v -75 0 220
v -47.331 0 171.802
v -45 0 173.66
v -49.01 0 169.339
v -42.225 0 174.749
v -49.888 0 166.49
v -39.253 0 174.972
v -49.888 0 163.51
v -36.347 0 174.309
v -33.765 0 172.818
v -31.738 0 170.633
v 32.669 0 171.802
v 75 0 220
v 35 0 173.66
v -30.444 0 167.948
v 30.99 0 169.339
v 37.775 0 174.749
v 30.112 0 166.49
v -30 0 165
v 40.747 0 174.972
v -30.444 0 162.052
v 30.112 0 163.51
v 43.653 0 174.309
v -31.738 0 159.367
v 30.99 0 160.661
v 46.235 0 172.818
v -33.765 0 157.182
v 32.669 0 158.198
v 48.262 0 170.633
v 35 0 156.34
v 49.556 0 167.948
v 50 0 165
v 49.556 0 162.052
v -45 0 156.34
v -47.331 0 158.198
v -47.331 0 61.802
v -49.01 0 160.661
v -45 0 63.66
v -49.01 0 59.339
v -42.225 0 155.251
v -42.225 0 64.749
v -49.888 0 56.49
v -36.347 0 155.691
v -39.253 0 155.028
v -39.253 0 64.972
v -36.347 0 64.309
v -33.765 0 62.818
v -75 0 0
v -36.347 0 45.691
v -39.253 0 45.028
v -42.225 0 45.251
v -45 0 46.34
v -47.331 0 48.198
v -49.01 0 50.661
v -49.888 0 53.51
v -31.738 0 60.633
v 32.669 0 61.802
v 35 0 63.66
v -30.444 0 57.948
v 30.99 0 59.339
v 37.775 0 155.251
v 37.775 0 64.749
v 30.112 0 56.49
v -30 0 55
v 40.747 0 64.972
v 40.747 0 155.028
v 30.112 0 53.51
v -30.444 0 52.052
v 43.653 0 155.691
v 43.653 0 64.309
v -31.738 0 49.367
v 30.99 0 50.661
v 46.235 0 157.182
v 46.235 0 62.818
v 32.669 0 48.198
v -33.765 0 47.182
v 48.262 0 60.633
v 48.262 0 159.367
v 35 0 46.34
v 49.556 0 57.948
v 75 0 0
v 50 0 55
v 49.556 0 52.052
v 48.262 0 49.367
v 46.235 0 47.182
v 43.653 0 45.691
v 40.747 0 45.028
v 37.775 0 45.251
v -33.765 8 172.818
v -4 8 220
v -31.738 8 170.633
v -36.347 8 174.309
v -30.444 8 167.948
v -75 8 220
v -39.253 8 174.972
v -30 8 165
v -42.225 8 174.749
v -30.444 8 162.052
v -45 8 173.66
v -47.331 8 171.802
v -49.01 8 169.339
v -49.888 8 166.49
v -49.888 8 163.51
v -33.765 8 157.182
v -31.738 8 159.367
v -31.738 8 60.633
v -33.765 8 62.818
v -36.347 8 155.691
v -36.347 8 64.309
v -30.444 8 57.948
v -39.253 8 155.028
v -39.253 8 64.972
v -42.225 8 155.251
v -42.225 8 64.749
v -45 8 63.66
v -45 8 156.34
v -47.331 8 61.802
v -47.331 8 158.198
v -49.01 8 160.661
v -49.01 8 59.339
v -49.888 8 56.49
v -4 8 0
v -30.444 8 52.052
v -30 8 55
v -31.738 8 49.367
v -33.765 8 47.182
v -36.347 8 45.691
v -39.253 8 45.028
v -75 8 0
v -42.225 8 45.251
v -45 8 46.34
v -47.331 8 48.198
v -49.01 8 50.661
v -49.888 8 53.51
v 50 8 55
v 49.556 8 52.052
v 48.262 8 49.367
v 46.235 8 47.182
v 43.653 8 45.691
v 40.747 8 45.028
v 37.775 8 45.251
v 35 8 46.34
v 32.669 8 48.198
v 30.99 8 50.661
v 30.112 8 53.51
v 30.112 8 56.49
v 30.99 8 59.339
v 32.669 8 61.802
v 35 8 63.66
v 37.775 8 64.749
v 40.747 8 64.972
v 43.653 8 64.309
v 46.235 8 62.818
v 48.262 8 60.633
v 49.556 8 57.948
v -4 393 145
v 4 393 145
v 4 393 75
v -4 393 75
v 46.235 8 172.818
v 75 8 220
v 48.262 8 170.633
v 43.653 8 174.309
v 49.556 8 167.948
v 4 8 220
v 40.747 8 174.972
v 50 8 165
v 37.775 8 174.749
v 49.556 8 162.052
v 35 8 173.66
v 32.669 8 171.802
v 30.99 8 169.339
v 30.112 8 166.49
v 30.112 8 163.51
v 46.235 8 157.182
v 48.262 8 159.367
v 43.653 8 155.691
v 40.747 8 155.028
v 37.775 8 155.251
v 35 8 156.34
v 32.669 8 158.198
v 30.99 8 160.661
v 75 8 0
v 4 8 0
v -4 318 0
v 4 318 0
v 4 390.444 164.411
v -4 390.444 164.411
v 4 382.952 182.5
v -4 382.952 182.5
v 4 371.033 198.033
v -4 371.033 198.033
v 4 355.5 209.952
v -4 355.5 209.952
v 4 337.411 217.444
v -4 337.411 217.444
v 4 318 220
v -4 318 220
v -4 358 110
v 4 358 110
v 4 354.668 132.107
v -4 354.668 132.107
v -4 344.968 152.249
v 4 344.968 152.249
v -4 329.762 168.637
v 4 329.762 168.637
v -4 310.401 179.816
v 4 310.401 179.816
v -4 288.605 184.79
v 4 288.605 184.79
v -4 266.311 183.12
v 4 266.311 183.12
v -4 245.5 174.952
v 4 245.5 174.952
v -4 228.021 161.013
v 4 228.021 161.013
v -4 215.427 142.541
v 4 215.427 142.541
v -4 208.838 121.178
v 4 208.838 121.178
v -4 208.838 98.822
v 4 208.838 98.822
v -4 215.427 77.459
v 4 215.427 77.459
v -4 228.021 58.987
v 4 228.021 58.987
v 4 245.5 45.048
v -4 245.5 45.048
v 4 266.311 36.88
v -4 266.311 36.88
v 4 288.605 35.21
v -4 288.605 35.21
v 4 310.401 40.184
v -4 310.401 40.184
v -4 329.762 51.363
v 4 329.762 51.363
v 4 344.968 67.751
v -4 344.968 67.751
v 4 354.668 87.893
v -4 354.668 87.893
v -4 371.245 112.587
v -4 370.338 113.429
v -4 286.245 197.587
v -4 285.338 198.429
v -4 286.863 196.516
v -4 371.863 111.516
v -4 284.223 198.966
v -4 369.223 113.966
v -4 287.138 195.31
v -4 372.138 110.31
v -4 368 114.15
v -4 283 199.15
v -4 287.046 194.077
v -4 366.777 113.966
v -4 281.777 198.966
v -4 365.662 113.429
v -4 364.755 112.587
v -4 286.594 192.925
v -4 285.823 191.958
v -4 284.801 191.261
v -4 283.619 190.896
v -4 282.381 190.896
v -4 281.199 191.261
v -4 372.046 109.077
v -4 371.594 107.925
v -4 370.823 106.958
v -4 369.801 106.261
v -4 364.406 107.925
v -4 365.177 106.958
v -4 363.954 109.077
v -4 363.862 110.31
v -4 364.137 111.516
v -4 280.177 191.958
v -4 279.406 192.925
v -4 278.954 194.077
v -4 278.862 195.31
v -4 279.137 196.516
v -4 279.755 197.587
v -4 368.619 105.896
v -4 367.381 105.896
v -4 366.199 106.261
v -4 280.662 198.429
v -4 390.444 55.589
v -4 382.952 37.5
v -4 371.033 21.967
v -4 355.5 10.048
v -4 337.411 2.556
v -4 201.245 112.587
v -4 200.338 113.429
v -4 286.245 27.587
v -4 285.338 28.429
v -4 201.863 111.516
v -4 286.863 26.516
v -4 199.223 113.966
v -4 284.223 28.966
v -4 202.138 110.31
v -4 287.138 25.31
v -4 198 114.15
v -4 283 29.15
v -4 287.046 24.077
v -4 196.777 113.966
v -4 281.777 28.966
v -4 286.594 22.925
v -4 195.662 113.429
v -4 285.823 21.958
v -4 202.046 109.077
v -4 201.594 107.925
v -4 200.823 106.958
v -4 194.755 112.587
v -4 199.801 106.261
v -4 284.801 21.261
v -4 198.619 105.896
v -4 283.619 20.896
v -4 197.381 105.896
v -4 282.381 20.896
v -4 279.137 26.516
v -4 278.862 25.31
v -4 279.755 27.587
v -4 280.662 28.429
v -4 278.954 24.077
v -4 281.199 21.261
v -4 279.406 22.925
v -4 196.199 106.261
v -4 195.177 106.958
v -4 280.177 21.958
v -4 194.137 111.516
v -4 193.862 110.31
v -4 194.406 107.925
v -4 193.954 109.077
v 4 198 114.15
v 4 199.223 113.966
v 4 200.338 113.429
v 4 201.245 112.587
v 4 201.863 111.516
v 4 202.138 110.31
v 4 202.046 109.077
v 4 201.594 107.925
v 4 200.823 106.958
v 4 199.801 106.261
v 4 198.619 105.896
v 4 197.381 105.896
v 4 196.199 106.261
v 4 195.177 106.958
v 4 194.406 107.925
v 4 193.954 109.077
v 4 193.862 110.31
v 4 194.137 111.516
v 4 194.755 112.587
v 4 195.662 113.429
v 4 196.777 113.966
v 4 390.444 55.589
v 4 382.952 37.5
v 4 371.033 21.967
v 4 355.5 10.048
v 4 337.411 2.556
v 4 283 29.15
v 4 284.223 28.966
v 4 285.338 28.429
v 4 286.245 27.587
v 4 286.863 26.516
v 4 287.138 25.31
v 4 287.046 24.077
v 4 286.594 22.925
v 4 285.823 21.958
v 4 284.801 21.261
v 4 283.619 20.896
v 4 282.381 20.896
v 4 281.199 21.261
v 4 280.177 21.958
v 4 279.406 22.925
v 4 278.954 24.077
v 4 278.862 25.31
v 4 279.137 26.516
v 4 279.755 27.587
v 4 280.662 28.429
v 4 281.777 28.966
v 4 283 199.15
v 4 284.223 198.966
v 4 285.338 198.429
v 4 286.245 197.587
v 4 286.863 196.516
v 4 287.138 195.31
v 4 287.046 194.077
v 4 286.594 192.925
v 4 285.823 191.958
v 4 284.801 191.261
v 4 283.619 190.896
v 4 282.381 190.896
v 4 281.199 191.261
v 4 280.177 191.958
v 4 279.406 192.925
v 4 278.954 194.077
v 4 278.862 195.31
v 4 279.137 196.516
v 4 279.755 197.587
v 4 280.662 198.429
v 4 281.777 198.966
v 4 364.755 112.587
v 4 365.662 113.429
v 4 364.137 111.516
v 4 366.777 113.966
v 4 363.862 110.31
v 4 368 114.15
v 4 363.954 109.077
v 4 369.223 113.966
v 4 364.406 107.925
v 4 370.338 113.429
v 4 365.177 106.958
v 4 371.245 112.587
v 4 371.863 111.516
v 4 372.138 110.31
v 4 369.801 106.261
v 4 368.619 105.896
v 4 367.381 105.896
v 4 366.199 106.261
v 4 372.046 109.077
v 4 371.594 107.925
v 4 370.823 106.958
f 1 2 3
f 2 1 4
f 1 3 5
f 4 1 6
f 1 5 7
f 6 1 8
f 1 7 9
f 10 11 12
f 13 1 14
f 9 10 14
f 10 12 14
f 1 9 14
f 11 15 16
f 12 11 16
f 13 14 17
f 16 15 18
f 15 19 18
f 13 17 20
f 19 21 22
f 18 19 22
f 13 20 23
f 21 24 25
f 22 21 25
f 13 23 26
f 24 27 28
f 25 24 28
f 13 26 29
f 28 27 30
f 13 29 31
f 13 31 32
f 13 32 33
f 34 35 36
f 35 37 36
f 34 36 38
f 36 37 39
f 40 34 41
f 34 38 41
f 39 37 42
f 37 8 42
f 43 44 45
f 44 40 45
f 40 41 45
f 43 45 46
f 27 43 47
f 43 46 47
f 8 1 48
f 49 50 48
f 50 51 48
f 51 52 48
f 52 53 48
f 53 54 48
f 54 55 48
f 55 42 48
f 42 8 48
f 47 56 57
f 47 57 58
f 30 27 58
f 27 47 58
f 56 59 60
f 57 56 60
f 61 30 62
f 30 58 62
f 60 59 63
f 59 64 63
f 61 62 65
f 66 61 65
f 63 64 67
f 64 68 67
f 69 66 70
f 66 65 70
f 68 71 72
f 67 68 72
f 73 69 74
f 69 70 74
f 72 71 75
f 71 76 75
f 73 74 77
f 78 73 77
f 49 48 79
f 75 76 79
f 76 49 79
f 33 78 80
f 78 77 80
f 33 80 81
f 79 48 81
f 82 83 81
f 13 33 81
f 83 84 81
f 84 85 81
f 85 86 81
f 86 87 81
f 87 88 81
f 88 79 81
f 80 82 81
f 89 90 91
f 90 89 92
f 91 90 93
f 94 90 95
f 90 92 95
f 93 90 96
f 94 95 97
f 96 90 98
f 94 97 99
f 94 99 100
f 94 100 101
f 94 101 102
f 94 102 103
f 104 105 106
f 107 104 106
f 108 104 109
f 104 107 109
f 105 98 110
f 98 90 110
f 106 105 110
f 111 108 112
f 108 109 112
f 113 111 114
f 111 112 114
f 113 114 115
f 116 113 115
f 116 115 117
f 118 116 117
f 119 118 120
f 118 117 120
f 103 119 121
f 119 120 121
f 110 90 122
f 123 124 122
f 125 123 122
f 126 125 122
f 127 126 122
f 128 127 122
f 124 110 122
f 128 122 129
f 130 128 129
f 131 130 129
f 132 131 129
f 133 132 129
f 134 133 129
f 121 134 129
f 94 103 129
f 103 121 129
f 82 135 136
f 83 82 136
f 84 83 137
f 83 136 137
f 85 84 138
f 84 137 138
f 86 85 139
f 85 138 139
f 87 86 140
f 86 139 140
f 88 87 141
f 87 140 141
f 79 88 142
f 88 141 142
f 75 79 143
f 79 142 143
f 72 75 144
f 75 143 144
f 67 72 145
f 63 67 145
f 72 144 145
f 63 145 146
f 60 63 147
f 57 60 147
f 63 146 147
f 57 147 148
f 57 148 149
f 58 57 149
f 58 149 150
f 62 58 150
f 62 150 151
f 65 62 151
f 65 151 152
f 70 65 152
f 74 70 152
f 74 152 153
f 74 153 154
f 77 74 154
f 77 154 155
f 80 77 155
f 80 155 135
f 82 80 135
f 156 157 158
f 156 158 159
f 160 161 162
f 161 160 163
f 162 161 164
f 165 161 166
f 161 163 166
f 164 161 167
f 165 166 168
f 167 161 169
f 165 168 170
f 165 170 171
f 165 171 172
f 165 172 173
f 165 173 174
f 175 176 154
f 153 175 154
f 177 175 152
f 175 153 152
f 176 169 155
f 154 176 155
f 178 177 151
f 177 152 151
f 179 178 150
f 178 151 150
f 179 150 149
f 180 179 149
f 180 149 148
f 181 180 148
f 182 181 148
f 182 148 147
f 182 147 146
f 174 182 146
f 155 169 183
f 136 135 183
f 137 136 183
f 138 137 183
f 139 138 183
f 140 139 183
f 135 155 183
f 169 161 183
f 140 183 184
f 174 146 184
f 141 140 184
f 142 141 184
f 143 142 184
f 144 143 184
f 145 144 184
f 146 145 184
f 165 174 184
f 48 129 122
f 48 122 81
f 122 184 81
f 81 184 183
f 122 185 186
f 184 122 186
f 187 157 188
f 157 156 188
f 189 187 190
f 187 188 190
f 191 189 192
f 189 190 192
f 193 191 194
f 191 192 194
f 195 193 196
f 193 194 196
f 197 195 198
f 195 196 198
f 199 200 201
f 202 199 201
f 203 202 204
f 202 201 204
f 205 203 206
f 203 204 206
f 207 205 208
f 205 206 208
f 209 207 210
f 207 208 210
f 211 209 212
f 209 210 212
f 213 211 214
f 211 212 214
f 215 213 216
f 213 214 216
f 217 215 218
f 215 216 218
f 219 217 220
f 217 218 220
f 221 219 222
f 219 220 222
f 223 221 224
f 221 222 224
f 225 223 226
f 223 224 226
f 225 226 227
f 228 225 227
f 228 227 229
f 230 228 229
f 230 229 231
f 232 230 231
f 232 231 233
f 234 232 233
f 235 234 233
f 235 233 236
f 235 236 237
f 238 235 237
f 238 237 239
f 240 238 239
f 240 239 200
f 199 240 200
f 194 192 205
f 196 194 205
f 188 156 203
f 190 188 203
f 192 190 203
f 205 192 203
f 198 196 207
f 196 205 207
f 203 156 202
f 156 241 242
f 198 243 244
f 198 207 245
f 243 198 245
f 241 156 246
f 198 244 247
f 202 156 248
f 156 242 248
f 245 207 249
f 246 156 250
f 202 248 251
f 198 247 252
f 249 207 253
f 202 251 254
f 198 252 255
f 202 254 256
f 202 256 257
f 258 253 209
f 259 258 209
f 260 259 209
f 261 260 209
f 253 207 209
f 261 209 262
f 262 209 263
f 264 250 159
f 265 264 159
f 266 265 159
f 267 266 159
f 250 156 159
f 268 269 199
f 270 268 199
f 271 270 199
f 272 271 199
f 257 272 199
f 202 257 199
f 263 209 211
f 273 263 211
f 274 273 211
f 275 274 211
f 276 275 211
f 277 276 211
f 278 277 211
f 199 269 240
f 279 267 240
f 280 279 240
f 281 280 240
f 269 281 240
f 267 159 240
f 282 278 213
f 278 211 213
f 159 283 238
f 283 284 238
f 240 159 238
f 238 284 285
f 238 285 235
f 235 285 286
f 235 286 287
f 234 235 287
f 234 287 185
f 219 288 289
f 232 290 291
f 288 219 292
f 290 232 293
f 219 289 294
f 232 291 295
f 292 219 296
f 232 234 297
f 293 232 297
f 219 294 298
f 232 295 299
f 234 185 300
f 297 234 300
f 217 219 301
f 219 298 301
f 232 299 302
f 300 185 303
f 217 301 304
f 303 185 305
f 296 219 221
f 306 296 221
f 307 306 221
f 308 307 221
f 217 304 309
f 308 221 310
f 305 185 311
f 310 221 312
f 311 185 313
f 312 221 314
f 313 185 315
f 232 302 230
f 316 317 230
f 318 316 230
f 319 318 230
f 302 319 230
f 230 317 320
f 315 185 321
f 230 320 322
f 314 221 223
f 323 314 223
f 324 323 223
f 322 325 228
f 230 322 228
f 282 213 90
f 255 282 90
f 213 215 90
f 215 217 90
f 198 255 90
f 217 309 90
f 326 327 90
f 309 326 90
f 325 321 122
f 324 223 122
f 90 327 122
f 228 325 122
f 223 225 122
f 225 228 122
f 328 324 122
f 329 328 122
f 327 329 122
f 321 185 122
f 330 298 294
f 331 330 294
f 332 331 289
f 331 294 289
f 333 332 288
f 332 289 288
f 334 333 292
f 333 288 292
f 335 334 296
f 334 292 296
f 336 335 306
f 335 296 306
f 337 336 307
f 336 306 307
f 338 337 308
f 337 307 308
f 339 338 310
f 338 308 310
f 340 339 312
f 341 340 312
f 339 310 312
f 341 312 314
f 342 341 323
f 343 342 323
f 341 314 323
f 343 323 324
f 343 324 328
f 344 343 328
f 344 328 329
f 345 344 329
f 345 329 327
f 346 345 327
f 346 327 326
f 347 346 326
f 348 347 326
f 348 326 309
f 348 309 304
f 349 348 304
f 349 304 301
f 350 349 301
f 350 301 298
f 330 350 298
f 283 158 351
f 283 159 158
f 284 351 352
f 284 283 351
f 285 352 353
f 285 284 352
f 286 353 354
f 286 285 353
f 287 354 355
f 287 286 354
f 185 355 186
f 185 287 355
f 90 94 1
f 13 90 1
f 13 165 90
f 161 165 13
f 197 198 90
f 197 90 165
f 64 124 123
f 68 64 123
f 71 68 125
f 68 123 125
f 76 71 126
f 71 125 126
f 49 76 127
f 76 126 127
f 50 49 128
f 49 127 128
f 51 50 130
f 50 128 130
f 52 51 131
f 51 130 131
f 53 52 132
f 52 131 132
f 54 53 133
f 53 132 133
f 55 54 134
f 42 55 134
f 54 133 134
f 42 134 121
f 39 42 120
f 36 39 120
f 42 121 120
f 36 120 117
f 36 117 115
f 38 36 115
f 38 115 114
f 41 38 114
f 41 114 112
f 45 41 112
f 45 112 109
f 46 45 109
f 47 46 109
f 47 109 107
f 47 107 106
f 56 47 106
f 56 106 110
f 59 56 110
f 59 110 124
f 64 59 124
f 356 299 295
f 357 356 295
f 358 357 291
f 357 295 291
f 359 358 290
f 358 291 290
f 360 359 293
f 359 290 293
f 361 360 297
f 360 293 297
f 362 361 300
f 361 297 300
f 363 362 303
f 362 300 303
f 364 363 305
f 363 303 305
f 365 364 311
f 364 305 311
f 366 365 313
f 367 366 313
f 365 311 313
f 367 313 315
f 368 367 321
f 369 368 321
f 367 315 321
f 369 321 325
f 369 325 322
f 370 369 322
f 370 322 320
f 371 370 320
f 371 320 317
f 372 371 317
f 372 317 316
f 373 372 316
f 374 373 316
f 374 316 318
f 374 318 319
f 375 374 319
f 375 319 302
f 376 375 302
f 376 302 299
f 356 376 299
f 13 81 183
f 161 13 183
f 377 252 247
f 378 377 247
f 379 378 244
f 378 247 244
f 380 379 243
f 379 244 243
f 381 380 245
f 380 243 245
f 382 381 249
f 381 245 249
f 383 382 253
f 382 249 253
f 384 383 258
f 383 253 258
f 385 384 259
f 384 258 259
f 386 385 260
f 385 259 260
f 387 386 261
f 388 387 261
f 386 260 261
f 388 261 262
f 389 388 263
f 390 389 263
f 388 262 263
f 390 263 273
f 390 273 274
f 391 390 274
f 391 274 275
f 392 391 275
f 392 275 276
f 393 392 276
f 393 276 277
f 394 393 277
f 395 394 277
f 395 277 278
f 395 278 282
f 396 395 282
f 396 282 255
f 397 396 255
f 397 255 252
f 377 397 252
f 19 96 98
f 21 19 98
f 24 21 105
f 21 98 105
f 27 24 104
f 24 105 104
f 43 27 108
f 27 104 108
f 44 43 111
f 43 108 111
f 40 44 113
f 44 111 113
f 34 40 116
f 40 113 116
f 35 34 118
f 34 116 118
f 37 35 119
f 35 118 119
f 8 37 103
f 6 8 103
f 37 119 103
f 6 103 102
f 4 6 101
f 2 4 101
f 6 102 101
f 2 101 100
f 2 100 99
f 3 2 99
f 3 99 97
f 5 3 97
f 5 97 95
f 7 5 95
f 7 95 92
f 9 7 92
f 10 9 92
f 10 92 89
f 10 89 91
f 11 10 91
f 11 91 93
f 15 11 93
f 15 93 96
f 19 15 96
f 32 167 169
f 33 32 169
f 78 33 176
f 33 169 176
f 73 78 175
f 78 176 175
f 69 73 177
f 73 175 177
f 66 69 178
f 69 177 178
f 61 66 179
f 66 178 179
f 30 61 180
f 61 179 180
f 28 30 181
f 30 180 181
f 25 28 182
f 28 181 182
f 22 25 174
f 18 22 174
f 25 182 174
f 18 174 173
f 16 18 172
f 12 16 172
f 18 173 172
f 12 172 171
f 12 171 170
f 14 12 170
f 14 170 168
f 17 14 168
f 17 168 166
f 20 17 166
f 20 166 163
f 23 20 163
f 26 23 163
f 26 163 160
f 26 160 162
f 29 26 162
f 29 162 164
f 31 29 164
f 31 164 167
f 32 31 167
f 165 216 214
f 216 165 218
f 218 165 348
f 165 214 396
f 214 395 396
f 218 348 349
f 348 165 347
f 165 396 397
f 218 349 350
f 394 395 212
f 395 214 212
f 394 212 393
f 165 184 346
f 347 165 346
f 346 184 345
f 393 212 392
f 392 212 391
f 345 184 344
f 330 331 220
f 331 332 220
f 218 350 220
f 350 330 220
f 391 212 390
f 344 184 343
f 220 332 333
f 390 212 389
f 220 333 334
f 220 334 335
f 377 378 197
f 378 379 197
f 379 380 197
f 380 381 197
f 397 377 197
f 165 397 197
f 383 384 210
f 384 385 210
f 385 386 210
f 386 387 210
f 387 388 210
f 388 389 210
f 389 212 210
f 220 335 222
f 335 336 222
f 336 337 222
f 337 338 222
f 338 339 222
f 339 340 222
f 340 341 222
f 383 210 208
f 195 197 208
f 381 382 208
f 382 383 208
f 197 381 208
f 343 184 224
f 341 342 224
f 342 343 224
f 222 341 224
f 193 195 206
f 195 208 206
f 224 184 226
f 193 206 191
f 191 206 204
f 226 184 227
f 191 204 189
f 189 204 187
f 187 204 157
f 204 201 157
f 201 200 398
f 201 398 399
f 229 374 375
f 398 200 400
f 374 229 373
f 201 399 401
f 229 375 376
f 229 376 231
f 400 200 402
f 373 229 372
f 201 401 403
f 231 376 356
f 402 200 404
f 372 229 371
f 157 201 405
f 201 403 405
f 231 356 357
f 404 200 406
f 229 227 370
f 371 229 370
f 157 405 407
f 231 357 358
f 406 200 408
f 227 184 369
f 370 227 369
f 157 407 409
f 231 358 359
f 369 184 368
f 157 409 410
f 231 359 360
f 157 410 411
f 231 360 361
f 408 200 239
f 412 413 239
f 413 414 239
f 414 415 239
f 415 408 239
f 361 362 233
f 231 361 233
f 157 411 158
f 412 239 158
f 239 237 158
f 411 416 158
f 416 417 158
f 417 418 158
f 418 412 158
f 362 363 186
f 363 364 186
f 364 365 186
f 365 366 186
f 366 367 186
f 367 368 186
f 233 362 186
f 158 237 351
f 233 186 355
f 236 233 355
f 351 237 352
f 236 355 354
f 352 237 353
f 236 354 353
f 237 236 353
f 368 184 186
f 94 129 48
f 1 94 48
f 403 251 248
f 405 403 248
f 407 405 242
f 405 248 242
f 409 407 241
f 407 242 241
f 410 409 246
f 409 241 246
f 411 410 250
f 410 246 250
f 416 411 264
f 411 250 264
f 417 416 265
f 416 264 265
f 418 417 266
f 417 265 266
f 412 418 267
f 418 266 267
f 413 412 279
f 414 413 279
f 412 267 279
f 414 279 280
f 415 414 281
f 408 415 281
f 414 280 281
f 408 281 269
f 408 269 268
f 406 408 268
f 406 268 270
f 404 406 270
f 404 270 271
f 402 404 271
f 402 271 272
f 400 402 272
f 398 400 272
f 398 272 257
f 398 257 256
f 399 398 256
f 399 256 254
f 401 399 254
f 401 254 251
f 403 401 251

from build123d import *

# Parameters (mm, degrees)
BOSS_EXTRUDE1_DEPTH     = 220
F_20_0MM_DOWEL_HOLE1_D  = 20
FILLET1_R               = 75
SKETCH4_R               = 75
CUT_EXTRUDE1_DEPTH      = 458.263600126
F_8_0_MM_DOWEL_HOLES1_D = 8.3


with BuildPart() as part:
    # Sketch1 → Boss-Extrude1 (new body)
    with BuildSketch(Plane.XY):
        Polygon((-4, 393), (-4, 8), (-75, 8), (-75, 0), (75, 0), (75, 8), (4, 8), (4, 393), align=None)
    extrude(amount=BOSS_EXTRUDE1_DEPTH)

    # Ø20.0mm Dowel Hole1 (through all)
    with Locations(Plane(origin=(0, 0, 0), x_dir=(-1, 0, 0), z_dir=(0, -1, 0))):
        with Locations((-40, -55), (-40, -165), (40, -165), (40, -55)):
            Hole(F_20_0MM_DOWEL_HOLE1_D / 2)

    # Fillet1
    fillet1_edges = [part.edges().sort_by_distance(p)[0] for p in [
        (0, 393, 0),
        (0, 393, 220),
    ]]
    fillet(fillet1_edges, radius=FILLET1_R)

    # Sketch4 → Cut-Extrude1 (cut, through all)
    with BuildSketch(Plane(origin=(4, 0, 0), x_dir=(0, 0, -1), z_dir=(1, 0, 0))):
        with Locations(Location((-110, 283, 0), (0, 0, 90))):
            Circle(SKETCH4_R)
    extrude(amount=-CUT_EXTRUDE1_DEPTH, mode=Mode.SUBTRACT)

    # Ø8.0 mm Dowel Holes1 (through all)
    with Locations(Plane(origin=(4, 0, 0), x_dir=(0, 0, -1), z_dir=(1, 0, 0))):
        with Locations((-110, 368), (-195, 283), (-110, 198), (-25, 283)):
            Hole(F_8_0_MM_DOWEL_HOLES1_D / 2)


solid = part.part
